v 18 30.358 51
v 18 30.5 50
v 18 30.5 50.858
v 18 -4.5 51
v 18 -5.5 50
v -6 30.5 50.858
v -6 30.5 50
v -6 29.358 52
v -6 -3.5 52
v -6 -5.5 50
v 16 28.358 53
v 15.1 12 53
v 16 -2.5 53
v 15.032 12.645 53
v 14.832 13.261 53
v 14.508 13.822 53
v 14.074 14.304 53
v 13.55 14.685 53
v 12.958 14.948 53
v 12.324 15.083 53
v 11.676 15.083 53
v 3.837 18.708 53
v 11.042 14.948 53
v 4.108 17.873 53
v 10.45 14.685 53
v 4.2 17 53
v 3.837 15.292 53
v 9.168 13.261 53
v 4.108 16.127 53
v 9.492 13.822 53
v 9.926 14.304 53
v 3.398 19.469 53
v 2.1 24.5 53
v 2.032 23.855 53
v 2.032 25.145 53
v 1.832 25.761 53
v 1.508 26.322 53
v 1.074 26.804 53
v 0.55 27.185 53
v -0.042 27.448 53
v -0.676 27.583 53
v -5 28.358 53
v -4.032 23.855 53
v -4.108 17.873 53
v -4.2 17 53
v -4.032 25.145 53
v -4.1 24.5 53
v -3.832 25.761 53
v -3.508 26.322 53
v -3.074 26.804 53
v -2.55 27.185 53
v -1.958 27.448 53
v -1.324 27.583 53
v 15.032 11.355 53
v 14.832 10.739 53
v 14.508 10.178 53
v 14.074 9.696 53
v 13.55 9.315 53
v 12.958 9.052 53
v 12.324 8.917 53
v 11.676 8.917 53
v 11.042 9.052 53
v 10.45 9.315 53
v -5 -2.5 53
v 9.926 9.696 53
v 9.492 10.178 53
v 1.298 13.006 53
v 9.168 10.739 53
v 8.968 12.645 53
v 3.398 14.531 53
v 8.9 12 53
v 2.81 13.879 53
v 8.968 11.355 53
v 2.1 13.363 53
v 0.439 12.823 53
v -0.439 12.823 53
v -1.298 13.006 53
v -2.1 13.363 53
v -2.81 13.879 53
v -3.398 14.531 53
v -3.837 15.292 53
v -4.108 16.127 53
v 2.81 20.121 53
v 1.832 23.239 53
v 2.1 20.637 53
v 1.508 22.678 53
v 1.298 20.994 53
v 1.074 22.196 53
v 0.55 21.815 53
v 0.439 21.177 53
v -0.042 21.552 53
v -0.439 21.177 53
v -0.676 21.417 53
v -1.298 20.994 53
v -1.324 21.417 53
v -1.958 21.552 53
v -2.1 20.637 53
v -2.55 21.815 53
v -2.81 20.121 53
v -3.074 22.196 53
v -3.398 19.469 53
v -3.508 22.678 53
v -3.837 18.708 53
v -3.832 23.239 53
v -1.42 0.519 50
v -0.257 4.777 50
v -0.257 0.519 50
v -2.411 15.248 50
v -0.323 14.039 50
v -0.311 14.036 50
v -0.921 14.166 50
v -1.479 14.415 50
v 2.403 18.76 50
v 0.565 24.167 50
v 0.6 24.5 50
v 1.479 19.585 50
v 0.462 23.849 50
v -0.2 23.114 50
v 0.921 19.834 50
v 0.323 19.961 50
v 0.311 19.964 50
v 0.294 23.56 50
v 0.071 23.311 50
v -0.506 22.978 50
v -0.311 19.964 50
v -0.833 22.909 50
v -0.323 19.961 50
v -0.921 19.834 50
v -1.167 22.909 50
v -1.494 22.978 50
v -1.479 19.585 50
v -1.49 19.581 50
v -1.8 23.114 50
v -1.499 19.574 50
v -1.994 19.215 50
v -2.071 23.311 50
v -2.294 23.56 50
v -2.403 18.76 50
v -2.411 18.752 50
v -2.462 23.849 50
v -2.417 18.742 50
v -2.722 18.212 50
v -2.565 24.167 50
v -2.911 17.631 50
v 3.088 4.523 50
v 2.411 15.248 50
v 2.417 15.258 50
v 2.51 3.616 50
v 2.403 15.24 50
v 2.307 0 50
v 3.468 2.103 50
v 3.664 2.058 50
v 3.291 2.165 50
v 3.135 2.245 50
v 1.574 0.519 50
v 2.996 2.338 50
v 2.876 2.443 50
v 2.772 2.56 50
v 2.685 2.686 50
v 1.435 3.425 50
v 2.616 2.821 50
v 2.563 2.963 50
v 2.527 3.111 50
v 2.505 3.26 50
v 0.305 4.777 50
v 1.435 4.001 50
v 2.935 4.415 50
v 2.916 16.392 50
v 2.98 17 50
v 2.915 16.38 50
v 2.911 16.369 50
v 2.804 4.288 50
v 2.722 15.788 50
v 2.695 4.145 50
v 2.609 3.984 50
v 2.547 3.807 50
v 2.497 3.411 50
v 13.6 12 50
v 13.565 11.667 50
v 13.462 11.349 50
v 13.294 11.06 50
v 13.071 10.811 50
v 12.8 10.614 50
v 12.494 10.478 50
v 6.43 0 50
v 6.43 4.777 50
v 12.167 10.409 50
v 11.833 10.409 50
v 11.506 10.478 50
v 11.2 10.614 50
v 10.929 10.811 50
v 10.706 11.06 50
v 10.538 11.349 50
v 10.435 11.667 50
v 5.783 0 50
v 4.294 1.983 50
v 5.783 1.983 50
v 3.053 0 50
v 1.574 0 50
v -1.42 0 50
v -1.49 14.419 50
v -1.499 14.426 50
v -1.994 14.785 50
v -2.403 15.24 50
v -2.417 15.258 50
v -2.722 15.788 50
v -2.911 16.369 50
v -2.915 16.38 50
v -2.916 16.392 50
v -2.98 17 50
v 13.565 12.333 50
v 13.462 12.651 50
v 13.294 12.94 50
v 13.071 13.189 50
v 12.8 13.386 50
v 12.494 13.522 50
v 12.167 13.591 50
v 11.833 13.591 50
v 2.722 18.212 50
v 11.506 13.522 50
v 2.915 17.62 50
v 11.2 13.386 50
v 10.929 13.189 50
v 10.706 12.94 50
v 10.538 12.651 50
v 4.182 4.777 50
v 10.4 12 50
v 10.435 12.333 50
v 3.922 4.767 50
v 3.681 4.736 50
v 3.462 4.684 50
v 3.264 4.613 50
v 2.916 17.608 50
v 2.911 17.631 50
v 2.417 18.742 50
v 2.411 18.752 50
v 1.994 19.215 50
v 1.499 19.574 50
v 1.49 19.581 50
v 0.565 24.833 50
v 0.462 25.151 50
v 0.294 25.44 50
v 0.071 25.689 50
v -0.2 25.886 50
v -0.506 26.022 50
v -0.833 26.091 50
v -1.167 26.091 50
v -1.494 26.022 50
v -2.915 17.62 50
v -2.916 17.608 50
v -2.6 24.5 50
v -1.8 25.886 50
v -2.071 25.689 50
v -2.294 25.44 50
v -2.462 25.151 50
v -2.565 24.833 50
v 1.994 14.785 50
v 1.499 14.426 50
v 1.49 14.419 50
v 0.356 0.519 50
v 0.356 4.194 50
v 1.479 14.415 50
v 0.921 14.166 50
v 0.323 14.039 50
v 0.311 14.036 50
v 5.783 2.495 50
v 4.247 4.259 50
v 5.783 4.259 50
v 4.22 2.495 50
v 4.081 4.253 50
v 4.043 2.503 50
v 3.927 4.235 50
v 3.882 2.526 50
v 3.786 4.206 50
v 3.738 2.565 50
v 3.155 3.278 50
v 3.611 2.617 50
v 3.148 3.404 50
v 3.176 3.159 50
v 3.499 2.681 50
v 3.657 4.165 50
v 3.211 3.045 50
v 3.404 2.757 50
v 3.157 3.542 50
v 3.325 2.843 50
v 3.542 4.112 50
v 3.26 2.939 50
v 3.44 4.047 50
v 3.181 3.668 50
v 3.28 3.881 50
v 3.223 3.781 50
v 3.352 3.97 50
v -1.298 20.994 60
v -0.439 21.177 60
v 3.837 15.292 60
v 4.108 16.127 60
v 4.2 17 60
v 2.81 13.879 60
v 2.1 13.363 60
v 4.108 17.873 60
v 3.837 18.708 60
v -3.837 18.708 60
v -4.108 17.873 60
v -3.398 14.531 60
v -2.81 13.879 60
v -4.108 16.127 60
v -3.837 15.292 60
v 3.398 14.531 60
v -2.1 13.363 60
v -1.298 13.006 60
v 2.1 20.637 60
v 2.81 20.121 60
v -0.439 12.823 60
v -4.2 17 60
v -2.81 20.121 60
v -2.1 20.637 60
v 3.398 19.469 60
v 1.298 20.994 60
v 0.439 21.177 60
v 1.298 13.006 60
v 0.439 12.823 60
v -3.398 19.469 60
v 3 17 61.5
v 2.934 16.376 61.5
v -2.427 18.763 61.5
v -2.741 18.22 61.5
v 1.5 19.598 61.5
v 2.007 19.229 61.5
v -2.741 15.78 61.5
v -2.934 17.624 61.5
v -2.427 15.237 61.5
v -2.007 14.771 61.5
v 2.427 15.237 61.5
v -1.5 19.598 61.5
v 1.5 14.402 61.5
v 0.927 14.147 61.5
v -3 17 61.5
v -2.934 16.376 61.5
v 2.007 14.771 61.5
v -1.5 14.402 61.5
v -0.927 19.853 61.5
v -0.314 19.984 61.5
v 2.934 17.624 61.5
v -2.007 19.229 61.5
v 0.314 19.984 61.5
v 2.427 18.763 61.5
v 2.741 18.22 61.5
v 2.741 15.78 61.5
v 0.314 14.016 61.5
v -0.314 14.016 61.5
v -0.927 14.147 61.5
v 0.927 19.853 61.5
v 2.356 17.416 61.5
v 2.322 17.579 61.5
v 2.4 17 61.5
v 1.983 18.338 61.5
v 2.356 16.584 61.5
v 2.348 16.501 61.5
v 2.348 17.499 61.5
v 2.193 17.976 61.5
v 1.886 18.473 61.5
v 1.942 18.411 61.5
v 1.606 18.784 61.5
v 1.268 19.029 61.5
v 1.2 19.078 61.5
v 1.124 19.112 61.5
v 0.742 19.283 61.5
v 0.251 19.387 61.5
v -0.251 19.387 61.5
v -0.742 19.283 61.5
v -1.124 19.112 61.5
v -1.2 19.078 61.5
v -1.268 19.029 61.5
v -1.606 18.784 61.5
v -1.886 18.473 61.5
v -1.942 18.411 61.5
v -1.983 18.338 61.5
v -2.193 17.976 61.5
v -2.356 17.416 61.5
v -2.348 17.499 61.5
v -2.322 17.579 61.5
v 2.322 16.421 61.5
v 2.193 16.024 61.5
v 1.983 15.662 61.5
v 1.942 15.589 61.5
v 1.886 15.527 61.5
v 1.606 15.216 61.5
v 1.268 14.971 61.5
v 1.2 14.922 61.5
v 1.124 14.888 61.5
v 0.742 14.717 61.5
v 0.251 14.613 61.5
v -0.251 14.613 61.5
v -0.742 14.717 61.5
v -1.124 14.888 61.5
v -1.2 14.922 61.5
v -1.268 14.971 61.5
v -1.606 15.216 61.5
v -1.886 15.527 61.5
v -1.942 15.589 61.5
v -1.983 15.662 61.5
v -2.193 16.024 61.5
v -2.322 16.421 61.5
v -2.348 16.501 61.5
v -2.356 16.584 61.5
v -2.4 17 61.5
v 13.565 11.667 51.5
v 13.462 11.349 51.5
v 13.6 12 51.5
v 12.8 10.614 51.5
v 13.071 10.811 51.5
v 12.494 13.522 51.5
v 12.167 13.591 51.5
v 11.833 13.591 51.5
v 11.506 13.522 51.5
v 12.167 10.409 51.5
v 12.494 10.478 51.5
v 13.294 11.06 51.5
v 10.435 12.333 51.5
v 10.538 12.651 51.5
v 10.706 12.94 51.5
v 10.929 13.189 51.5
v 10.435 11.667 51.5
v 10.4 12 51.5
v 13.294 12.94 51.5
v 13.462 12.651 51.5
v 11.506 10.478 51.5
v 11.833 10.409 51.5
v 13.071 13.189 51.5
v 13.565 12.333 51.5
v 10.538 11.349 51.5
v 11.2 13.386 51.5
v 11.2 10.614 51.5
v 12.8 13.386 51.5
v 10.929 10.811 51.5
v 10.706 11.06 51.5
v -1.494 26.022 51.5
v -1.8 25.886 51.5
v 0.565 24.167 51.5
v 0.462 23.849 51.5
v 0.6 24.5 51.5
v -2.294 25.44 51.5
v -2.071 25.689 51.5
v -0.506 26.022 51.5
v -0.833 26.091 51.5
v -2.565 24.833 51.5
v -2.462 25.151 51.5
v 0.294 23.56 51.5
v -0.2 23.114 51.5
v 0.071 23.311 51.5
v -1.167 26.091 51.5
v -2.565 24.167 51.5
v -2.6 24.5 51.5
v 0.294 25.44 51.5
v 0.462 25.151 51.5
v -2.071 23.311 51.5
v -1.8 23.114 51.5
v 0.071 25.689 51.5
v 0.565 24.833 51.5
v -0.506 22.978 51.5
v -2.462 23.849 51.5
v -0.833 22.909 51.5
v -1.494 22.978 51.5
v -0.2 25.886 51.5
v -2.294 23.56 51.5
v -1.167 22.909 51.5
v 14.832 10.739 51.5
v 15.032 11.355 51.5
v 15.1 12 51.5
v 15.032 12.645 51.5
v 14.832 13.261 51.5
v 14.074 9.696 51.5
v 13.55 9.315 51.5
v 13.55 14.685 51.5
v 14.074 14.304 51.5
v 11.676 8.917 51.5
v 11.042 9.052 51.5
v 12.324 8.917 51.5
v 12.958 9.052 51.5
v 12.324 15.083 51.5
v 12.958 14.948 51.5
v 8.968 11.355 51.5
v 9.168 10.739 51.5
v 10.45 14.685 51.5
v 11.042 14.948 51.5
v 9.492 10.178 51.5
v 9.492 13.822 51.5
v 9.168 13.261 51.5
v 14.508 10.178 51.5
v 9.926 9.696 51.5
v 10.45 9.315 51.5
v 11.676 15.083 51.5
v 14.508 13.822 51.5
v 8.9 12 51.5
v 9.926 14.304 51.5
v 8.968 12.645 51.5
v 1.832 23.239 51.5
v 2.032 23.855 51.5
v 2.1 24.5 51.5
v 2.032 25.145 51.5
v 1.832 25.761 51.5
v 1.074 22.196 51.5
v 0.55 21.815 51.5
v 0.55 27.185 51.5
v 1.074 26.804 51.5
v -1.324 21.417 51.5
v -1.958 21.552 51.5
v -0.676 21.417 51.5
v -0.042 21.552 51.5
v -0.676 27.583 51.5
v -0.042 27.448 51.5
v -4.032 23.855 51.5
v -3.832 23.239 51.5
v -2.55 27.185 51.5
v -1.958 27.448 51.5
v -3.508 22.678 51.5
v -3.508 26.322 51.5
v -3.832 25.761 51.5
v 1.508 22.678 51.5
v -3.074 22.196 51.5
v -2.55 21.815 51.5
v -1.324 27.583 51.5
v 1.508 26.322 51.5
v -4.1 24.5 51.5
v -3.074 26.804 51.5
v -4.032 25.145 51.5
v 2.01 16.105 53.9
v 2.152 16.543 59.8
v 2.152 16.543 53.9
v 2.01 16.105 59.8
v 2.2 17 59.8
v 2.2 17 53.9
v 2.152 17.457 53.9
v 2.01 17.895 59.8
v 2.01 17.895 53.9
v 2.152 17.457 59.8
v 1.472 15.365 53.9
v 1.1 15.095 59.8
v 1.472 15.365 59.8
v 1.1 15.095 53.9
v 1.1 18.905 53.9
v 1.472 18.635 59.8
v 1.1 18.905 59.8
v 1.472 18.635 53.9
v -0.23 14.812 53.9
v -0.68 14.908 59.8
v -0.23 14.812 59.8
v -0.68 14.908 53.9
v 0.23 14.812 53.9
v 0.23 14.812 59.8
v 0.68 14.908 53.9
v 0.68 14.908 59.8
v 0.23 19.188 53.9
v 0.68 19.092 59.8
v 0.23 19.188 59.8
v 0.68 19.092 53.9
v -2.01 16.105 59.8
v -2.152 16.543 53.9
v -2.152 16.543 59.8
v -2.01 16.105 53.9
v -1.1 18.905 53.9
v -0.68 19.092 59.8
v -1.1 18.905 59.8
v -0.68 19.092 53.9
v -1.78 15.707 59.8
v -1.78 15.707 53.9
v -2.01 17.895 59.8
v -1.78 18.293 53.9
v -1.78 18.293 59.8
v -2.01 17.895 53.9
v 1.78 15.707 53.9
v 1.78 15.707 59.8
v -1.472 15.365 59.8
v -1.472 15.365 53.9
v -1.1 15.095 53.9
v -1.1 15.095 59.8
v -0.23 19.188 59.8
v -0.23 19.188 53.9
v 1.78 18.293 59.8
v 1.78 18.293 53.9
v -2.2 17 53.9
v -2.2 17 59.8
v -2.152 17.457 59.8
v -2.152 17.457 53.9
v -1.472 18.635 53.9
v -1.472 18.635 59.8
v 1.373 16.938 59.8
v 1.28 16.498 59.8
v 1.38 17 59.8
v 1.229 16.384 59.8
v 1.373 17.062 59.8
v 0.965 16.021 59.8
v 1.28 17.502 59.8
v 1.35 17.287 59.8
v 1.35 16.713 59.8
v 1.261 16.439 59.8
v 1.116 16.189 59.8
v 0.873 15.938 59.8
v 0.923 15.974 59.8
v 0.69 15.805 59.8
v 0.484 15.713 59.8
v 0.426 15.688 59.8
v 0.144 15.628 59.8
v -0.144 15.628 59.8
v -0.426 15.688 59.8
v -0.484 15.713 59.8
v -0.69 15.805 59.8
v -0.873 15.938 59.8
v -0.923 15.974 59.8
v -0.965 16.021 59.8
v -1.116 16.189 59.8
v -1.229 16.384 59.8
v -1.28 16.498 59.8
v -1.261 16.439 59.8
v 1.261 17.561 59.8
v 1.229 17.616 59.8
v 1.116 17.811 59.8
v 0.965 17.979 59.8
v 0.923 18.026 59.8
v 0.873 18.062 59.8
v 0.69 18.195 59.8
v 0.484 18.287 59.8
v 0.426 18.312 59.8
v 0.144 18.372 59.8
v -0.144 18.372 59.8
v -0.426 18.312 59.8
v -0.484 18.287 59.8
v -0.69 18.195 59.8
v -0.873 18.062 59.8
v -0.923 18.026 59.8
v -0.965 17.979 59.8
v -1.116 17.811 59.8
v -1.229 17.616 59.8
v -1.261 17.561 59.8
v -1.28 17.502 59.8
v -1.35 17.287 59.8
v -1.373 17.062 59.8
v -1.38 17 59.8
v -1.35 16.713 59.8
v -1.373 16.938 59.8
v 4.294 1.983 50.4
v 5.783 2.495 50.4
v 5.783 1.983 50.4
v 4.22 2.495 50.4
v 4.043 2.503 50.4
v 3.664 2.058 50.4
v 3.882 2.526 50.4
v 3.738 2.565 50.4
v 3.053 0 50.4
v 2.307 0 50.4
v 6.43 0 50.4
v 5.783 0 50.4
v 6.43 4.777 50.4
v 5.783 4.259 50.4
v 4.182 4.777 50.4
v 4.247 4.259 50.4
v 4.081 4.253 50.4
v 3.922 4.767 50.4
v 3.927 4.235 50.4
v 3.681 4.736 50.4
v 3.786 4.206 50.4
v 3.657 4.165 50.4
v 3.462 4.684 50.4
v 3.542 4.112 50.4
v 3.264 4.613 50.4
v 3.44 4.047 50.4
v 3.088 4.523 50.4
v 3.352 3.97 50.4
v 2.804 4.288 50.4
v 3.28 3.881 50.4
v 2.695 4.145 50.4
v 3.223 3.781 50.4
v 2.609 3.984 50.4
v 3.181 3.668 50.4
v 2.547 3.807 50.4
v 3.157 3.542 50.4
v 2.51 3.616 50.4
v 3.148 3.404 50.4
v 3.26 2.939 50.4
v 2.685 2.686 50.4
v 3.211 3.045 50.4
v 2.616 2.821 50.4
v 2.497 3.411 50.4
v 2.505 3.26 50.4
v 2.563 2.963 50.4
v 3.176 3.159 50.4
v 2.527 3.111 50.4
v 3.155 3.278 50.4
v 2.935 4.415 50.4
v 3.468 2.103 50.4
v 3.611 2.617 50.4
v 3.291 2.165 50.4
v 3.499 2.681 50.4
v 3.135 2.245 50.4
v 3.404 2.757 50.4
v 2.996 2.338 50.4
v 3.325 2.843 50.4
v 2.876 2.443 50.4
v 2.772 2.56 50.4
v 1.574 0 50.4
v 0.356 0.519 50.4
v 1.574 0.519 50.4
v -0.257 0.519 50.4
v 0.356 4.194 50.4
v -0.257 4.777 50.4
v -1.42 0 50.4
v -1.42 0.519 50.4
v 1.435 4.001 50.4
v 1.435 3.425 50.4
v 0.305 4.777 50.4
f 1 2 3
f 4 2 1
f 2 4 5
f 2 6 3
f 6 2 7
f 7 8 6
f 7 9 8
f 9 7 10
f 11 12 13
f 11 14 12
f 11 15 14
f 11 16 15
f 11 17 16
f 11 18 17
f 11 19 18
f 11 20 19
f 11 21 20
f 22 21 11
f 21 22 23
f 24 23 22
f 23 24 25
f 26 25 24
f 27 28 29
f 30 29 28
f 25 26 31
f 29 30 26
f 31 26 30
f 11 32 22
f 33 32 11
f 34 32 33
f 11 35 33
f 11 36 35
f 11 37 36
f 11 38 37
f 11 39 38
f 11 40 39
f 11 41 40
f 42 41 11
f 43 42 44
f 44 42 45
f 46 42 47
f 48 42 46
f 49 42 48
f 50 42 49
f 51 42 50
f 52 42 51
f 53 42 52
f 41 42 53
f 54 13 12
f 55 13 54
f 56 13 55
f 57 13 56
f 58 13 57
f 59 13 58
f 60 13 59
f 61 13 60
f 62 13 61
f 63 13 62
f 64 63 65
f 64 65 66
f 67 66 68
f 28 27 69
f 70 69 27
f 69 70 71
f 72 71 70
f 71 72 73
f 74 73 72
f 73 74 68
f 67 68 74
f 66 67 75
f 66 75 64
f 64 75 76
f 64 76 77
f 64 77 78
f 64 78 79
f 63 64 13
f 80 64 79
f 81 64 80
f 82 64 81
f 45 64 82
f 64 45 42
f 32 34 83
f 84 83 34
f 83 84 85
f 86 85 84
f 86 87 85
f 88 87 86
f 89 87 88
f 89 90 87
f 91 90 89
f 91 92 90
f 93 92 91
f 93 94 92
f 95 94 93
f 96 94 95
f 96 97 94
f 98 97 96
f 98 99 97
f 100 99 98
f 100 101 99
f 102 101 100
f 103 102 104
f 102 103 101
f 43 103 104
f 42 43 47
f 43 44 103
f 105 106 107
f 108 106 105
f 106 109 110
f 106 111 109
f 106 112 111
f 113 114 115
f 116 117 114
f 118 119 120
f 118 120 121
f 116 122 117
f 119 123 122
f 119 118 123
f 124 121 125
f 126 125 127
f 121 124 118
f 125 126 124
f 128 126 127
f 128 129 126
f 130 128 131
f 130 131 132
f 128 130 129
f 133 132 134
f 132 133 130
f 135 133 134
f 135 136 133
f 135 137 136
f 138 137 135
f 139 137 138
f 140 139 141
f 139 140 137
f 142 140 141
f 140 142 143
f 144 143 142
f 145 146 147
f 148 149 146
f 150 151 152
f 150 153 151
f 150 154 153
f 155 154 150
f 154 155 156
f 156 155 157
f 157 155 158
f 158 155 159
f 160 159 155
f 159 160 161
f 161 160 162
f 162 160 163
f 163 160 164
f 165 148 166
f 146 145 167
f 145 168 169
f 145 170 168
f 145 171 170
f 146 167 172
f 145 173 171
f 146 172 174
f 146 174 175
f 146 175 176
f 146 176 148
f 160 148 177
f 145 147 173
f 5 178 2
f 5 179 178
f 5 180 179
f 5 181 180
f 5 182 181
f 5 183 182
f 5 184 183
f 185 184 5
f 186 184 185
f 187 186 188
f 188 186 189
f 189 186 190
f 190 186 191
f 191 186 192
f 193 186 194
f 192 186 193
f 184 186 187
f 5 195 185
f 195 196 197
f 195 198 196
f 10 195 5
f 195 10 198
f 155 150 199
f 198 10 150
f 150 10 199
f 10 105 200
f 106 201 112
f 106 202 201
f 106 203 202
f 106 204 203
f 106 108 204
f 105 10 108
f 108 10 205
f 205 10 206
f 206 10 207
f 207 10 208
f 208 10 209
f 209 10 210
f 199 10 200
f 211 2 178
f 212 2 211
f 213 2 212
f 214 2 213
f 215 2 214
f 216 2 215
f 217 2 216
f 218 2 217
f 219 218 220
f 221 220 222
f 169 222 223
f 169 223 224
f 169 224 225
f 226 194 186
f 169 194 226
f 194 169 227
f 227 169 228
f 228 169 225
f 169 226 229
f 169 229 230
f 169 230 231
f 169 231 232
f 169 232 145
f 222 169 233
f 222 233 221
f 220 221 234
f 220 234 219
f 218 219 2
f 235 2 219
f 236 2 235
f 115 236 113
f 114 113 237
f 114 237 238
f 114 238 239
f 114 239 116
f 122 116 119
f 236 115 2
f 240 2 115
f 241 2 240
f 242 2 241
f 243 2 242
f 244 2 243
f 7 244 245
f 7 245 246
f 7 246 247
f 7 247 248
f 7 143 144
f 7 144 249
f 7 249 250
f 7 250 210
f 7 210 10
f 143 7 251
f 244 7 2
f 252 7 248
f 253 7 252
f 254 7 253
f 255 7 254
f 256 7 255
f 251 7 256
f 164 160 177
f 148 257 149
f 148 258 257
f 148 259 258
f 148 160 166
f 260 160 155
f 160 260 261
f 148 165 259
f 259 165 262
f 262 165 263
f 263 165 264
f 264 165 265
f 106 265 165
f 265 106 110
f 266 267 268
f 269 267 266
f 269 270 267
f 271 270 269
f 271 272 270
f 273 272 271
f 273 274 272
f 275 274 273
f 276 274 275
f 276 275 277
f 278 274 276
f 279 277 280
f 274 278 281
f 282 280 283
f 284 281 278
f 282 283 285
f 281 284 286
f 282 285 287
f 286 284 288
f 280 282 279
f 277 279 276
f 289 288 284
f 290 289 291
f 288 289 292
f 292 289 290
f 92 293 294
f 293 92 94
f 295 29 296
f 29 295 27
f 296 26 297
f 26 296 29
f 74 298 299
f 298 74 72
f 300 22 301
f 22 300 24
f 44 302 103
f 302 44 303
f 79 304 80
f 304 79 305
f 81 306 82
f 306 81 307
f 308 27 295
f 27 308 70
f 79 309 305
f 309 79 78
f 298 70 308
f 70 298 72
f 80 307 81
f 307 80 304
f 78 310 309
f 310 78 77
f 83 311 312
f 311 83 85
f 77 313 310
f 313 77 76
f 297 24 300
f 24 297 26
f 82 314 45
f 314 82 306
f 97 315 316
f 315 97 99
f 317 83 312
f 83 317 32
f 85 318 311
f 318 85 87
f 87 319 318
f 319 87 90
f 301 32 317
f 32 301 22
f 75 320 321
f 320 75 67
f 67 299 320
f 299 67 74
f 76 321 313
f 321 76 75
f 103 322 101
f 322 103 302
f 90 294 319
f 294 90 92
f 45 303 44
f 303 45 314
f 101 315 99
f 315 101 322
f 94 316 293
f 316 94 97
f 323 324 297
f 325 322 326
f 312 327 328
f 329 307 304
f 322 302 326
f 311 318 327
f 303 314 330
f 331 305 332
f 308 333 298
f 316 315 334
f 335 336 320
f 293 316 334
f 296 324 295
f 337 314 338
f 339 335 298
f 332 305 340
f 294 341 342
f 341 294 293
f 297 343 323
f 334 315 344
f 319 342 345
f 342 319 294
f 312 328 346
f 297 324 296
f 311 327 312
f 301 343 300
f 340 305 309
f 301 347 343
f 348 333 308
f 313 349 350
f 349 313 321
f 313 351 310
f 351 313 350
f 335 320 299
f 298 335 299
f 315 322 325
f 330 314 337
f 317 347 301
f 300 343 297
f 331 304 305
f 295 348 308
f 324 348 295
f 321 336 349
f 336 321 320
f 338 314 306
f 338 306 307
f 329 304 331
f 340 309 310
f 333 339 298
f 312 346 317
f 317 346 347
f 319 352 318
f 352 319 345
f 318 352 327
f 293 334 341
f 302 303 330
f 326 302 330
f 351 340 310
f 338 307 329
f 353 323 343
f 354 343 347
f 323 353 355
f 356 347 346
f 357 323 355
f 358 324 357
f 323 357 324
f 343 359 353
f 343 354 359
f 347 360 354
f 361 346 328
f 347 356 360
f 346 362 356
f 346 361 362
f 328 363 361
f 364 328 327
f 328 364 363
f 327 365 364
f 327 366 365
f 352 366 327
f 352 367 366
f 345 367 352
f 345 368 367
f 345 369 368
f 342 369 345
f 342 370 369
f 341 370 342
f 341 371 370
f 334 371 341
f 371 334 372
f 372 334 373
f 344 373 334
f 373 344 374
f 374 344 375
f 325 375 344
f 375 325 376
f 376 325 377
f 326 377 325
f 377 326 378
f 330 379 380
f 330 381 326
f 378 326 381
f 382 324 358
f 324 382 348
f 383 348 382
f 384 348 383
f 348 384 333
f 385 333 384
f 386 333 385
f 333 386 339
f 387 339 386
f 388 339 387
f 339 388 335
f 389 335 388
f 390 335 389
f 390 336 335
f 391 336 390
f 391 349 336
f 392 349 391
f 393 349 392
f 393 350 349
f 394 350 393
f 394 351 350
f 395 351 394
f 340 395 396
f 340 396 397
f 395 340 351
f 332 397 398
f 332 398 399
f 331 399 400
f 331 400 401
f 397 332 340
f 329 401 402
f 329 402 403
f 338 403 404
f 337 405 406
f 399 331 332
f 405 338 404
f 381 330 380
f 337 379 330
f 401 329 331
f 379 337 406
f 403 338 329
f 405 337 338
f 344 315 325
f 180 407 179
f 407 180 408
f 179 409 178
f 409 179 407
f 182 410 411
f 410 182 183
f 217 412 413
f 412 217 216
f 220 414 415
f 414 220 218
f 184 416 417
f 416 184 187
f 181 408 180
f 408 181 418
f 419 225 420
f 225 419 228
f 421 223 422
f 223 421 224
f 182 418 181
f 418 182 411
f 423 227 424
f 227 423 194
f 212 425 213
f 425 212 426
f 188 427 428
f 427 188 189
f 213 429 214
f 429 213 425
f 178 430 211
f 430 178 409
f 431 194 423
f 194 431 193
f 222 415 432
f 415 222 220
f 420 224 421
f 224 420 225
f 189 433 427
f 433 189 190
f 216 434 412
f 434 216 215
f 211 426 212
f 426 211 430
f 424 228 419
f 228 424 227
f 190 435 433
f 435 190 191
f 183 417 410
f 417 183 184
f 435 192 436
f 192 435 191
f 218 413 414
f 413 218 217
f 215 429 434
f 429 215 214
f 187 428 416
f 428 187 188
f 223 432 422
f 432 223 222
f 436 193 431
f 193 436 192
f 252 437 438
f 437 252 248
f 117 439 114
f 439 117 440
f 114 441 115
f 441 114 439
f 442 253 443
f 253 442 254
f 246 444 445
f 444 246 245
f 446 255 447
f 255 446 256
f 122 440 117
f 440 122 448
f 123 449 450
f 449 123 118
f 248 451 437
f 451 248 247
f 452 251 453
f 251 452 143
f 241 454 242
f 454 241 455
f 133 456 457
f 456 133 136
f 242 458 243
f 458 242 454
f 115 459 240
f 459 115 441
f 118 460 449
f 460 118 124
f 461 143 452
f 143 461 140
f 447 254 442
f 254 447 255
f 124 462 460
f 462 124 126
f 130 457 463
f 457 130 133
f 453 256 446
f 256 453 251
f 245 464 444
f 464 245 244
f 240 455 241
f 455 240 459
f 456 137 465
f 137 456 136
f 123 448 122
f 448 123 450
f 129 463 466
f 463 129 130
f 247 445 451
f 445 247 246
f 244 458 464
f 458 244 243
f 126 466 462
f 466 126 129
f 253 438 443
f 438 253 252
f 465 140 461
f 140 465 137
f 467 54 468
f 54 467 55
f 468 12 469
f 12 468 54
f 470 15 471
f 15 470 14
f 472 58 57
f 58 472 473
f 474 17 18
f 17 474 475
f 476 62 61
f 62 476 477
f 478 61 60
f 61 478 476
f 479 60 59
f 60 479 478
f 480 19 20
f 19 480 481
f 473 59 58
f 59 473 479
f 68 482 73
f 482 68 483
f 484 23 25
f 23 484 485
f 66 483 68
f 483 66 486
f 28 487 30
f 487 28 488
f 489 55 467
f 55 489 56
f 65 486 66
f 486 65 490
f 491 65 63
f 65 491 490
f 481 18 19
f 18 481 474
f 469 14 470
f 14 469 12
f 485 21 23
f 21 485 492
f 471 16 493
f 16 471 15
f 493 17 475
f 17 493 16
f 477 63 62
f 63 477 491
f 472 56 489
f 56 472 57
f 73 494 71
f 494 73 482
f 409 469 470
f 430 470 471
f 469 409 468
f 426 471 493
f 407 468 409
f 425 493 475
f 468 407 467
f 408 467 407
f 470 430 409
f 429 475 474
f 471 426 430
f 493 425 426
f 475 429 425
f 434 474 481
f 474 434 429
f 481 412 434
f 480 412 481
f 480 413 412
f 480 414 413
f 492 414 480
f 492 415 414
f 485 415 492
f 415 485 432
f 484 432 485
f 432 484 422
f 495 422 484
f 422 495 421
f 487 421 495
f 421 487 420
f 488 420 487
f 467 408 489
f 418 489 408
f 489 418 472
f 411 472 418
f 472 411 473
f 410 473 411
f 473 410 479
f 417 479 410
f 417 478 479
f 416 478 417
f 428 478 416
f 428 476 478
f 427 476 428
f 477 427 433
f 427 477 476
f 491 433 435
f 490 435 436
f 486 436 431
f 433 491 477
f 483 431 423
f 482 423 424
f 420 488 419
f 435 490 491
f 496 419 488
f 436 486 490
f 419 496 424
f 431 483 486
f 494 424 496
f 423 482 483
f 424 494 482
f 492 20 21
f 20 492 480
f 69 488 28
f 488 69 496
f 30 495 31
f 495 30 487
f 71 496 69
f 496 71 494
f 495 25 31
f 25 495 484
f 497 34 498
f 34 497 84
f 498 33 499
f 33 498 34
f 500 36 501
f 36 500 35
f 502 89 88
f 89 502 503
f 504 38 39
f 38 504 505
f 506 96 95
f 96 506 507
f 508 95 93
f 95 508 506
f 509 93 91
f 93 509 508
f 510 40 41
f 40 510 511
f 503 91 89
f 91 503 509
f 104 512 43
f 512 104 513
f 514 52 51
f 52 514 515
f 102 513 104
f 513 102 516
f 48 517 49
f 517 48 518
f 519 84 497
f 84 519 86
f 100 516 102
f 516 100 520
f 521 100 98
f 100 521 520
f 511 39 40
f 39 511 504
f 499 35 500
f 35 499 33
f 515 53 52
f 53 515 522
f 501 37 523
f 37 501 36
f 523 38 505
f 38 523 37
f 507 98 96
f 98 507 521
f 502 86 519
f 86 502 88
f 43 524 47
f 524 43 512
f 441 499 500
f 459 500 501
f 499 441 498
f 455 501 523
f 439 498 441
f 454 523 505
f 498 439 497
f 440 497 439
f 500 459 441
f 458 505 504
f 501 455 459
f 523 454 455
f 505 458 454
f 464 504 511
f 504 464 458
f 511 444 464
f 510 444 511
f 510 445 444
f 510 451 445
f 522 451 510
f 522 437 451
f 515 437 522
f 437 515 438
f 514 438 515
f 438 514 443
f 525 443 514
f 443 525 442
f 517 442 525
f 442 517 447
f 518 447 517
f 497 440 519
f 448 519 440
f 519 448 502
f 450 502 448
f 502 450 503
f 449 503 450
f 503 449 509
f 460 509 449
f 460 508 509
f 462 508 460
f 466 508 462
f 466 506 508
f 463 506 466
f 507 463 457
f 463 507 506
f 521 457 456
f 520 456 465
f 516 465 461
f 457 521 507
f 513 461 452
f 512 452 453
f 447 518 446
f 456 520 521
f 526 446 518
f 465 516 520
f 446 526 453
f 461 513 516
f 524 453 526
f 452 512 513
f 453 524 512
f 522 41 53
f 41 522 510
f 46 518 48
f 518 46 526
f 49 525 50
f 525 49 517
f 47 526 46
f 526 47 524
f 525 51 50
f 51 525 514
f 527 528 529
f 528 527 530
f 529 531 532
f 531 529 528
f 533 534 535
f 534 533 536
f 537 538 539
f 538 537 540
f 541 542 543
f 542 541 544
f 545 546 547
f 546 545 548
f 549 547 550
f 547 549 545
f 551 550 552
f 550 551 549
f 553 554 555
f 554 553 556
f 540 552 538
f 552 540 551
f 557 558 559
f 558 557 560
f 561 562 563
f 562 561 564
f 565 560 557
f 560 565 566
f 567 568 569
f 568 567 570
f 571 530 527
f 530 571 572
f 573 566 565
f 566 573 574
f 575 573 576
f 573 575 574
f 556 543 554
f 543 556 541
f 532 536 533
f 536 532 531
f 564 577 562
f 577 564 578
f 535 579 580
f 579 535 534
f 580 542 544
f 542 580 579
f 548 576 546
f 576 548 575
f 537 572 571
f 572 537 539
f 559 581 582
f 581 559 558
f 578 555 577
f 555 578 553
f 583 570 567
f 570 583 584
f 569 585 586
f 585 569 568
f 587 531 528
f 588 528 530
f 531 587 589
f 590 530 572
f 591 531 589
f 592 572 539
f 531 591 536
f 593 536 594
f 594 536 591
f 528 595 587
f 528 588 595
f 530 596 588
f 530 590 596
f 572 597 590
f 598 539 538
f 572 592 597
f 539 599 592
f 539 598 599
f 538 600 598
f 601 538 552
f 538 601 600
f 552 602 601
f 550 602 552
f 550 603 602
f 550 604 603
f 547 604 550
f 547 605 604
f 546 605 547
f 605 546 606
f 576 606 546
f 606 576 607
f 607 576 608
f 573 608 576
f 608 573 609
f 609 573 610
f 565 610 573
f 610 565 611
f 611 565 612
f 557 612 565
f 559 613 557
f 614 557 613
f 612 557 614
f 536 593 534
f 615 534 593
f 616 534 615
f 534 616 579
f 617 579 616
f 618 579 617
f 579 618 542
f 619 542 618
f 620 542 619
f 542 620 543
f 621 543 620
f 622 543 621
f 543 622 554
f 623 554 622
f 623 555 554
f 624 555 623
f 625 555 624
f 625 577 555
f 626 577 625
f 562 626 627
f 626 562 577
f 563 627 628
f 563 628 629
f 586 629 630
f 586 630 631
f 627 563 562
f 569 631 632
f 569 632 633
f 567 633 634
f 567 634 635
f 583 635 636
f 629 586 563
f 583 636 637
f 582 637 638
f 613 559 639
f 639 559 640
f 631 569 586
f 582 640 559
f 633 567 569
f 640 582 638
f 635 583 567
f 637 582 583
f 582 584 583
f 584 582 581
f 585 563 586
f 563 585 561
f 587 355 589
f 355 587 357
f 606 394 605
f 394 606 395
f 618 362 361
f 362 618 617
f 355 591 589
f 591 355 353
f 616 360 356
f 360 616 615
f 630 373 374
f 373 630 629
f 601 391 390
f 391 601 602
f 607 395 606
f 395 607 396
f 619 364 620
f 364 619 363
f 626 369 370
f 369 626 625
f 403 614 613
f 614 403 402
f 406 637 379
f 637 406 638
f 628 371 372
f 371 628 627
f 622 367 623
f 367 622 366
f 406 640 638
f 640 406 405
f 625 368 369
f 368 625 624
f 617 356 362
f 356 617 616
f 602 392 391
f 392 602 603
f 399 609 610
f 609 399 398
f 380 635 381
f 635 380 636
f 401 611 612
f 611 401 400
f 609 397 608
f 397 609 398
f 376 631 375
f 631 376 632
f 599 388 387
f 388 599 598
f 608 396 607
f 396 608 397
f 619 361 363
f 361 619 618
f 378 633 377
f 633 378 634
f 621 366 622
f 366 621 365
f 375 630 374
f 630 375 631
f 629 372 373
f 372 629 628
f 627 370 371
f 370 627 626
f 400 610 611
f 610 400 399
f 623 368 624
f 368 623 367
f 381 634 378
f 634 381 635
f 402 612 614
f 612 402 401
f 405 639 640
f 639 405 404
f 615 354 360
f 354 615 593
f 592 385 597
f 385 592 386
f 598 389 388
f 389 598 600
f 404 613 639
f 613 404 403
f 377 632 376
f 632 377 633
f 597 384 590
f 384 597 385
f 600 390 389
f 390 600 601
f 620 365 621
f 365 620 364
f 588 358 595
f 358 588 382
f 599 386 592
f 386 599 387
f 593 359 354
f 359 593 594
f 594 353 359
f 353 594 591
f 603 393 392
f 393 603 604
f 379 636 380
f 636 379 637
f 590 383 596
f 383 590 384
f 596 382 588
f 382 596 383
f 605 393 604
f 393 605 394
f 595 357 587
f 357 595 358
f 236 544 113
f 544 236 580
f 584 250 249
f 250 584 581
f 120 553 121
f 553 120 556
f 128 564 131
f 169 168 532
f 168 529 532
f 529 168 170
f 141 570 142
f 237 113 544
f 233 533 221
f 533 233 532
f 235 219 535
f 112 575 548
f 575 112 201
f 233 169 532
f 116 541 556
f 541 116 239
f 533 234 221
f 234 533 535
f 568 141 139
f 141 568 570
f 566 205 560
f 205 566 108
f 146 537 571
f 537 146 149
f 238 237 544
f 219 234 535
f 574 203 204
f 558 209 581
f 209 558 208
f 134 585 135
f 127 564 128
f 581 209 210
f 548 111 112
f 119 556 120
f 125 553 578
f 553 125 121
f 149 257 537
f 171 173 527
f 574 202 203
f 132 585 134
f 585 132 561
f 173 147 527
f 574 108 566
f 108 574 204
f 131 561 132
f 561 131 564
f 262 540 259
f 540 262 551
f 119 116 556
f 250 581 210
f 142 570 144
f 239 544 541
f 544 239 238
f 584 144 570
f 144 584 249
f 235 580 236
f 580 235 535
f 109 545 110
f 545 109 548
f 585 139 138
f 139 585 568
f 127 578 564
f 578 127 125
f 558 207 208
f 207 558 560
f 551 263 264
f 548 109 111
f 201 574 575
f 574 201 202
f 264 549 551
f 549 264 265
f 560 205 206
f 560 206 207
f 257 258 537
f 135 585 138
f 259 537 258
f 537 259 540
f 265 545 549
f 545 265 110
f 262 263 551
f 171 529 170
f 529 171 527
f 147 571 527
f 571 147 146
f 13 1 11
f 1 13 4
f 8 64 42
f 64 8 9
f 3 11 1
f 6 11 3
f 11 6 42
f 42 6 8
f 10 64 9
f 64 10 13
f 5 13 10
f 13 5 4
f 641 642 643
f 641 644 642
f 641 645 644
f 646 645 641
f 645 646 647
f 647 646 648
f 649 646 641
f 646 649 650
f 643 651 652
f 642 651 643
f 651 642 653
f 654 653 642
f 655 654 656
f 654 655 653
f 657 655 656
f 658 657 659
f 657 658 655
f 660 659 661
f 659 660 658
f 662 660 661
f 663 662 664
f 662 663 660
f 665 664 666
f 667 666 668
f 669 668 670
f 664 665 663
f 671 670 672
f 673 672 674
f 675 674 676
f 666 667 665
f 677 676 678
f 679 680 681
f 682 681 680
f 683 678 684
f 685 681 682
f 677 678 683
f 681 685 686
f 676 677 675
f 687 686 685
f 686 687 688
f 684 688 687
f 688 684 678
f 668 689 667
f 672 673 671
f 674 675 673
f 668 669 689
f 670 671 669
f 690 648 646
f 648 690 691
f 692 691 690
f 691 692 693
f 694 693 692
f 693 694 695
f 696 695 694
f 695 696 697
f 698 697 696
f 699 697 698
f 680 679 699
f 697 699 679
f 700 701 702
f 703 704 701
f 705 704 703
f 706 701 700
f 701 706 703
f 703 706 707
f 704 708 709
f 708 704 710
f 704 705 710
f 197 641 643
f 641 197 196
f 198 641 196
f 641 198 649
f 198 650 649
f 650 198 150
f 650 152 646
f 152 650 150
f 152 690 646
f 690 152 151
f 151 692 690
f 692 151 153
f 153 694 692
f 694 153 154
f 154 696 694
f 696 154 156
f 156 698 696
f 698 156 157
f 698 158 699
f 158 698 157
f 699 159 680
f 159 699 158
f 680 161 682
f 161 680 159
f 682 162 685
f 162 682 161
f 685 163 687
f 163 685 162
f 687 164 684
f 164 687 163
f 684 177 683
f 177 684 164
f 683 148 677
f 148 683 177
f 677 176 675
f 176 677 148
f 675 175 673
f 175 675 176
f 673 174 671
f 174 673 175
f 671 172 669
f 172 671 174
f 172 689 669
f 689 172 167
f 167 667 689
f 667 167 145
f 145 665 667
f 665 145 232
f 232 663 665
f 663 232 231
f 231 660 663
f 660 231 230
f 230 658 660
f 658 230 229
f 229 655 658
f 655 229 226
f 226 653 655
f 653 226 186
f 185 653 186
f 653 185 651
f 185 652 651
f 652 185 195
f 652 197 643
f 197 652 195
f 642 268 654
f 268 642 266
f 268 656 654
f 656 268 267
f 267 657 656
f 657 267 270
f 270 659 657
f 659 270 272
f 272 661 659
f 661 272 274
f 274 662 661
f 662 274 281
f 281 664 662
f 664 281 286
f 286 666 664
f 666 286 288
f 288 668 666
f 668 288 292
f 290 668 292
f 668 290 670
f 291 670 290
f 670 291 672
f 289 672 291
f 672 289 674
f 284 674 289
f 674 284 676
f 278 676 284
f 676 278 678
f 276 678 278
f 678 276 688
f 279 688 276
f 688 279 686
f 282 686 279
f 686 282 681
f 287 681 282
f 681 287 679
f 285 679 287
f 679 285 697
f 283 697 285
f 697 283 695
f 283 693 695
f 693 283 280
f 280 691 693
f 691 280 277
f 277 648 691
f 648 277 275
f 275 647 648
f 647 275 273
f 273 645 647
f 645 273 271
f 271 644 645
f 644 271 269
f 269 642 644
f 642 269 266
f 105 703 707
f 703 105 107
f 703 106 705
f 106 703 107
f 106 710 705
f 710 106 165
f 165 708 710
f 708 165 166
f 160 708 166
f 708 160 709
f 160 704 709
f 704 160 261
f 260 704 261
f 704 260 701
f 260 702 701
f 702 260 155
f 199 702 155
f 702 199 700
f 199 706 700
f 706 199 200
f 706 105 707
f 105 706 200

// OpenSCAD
// PRUSA iteration4
// Filament sensor cover
// GNU GPL v3
// Josef Průša <iam@josefprusa.cz> and contributors
// http://www.reprap.org/wiki/Prusa_Mendel
// http://prusamendel.org

module part()
{
    difference()
    {
        union()
        {
            // base shape
            translate([-6, 50, -30.5]) cube([24, 3, 36]);
            translate([0, 60, -17]) rotate([90, 0, 0]) cylinder(r = 4.2, h = 10, $fn = 30);
            translate([0, 61.5, -17]) rotate([90, 0, 0]) cylinder(r1 = 3, r2 = 4.2, h = 1.5, $fn = 30);
        }

        // mounting screws
        translate([12, 60, -12]) rotate([90, 0, 0]) cylinder(r = 1.6, h = 20, $fn = 30);
        translate([-1, 60, -24.5]) rotate([90, 0, 0]) cylinder(r = 1.6, h = 20, $fn = 30);
        translate([12, 54.5, -12]) rotate([90, 0, 0]) cylinder(r = 3.1, h = 3, $fn = 30);
        translate([-1, 54.5, -24.5]) rotate([90, 0, 0]) cylinder(r = 3.1, h = 3, $fn = 30);

        // filament guide
        translate([0, 59.8, -17]) rotate([90, 0, 0]) cylinder(r = 2.2, h = 9.8, $fn = 30);
        translate([0, 61, -17]) rotate([90, 0, 0]) cylinder(r = 1, h = 20, $fn = 30);
        translate([0, 62.5, -17]) rotate([90, 0, 0]) cylinder(r2 = 1.2, r1 = 3, h = 3, $fn = 30);
        translate([0, 53.9, -17]) rotate([90, 0, 0]) cylinder(r1 = 2.2, r2 = 3, h = 4, $fn = 30);

        // nice edges
        translate([19, 50, -40]) rotate([0, 0, 45]) cube([10, 10, 50]);
        translate([-9, 49, -38]) rotate([0, 0, 45]) cube([6, 5, 50]);
        translate([-8, 56.5, -39]) rotate([45, 0, 0]) cube([50, 10, 10]);
        translate([-8, 56.5, -1]) rotate([45, 0, 0]) cube([50, 10, 10]);

        translate([7, 50.4, 0]) rotate([90, 180, 0]) linear_extrude(height = 0.6)
        { text("R1", font = "helvetica:style = Bold", size = 5, center = true); }
    }
}

rotate([90, 0, 0]) part();
